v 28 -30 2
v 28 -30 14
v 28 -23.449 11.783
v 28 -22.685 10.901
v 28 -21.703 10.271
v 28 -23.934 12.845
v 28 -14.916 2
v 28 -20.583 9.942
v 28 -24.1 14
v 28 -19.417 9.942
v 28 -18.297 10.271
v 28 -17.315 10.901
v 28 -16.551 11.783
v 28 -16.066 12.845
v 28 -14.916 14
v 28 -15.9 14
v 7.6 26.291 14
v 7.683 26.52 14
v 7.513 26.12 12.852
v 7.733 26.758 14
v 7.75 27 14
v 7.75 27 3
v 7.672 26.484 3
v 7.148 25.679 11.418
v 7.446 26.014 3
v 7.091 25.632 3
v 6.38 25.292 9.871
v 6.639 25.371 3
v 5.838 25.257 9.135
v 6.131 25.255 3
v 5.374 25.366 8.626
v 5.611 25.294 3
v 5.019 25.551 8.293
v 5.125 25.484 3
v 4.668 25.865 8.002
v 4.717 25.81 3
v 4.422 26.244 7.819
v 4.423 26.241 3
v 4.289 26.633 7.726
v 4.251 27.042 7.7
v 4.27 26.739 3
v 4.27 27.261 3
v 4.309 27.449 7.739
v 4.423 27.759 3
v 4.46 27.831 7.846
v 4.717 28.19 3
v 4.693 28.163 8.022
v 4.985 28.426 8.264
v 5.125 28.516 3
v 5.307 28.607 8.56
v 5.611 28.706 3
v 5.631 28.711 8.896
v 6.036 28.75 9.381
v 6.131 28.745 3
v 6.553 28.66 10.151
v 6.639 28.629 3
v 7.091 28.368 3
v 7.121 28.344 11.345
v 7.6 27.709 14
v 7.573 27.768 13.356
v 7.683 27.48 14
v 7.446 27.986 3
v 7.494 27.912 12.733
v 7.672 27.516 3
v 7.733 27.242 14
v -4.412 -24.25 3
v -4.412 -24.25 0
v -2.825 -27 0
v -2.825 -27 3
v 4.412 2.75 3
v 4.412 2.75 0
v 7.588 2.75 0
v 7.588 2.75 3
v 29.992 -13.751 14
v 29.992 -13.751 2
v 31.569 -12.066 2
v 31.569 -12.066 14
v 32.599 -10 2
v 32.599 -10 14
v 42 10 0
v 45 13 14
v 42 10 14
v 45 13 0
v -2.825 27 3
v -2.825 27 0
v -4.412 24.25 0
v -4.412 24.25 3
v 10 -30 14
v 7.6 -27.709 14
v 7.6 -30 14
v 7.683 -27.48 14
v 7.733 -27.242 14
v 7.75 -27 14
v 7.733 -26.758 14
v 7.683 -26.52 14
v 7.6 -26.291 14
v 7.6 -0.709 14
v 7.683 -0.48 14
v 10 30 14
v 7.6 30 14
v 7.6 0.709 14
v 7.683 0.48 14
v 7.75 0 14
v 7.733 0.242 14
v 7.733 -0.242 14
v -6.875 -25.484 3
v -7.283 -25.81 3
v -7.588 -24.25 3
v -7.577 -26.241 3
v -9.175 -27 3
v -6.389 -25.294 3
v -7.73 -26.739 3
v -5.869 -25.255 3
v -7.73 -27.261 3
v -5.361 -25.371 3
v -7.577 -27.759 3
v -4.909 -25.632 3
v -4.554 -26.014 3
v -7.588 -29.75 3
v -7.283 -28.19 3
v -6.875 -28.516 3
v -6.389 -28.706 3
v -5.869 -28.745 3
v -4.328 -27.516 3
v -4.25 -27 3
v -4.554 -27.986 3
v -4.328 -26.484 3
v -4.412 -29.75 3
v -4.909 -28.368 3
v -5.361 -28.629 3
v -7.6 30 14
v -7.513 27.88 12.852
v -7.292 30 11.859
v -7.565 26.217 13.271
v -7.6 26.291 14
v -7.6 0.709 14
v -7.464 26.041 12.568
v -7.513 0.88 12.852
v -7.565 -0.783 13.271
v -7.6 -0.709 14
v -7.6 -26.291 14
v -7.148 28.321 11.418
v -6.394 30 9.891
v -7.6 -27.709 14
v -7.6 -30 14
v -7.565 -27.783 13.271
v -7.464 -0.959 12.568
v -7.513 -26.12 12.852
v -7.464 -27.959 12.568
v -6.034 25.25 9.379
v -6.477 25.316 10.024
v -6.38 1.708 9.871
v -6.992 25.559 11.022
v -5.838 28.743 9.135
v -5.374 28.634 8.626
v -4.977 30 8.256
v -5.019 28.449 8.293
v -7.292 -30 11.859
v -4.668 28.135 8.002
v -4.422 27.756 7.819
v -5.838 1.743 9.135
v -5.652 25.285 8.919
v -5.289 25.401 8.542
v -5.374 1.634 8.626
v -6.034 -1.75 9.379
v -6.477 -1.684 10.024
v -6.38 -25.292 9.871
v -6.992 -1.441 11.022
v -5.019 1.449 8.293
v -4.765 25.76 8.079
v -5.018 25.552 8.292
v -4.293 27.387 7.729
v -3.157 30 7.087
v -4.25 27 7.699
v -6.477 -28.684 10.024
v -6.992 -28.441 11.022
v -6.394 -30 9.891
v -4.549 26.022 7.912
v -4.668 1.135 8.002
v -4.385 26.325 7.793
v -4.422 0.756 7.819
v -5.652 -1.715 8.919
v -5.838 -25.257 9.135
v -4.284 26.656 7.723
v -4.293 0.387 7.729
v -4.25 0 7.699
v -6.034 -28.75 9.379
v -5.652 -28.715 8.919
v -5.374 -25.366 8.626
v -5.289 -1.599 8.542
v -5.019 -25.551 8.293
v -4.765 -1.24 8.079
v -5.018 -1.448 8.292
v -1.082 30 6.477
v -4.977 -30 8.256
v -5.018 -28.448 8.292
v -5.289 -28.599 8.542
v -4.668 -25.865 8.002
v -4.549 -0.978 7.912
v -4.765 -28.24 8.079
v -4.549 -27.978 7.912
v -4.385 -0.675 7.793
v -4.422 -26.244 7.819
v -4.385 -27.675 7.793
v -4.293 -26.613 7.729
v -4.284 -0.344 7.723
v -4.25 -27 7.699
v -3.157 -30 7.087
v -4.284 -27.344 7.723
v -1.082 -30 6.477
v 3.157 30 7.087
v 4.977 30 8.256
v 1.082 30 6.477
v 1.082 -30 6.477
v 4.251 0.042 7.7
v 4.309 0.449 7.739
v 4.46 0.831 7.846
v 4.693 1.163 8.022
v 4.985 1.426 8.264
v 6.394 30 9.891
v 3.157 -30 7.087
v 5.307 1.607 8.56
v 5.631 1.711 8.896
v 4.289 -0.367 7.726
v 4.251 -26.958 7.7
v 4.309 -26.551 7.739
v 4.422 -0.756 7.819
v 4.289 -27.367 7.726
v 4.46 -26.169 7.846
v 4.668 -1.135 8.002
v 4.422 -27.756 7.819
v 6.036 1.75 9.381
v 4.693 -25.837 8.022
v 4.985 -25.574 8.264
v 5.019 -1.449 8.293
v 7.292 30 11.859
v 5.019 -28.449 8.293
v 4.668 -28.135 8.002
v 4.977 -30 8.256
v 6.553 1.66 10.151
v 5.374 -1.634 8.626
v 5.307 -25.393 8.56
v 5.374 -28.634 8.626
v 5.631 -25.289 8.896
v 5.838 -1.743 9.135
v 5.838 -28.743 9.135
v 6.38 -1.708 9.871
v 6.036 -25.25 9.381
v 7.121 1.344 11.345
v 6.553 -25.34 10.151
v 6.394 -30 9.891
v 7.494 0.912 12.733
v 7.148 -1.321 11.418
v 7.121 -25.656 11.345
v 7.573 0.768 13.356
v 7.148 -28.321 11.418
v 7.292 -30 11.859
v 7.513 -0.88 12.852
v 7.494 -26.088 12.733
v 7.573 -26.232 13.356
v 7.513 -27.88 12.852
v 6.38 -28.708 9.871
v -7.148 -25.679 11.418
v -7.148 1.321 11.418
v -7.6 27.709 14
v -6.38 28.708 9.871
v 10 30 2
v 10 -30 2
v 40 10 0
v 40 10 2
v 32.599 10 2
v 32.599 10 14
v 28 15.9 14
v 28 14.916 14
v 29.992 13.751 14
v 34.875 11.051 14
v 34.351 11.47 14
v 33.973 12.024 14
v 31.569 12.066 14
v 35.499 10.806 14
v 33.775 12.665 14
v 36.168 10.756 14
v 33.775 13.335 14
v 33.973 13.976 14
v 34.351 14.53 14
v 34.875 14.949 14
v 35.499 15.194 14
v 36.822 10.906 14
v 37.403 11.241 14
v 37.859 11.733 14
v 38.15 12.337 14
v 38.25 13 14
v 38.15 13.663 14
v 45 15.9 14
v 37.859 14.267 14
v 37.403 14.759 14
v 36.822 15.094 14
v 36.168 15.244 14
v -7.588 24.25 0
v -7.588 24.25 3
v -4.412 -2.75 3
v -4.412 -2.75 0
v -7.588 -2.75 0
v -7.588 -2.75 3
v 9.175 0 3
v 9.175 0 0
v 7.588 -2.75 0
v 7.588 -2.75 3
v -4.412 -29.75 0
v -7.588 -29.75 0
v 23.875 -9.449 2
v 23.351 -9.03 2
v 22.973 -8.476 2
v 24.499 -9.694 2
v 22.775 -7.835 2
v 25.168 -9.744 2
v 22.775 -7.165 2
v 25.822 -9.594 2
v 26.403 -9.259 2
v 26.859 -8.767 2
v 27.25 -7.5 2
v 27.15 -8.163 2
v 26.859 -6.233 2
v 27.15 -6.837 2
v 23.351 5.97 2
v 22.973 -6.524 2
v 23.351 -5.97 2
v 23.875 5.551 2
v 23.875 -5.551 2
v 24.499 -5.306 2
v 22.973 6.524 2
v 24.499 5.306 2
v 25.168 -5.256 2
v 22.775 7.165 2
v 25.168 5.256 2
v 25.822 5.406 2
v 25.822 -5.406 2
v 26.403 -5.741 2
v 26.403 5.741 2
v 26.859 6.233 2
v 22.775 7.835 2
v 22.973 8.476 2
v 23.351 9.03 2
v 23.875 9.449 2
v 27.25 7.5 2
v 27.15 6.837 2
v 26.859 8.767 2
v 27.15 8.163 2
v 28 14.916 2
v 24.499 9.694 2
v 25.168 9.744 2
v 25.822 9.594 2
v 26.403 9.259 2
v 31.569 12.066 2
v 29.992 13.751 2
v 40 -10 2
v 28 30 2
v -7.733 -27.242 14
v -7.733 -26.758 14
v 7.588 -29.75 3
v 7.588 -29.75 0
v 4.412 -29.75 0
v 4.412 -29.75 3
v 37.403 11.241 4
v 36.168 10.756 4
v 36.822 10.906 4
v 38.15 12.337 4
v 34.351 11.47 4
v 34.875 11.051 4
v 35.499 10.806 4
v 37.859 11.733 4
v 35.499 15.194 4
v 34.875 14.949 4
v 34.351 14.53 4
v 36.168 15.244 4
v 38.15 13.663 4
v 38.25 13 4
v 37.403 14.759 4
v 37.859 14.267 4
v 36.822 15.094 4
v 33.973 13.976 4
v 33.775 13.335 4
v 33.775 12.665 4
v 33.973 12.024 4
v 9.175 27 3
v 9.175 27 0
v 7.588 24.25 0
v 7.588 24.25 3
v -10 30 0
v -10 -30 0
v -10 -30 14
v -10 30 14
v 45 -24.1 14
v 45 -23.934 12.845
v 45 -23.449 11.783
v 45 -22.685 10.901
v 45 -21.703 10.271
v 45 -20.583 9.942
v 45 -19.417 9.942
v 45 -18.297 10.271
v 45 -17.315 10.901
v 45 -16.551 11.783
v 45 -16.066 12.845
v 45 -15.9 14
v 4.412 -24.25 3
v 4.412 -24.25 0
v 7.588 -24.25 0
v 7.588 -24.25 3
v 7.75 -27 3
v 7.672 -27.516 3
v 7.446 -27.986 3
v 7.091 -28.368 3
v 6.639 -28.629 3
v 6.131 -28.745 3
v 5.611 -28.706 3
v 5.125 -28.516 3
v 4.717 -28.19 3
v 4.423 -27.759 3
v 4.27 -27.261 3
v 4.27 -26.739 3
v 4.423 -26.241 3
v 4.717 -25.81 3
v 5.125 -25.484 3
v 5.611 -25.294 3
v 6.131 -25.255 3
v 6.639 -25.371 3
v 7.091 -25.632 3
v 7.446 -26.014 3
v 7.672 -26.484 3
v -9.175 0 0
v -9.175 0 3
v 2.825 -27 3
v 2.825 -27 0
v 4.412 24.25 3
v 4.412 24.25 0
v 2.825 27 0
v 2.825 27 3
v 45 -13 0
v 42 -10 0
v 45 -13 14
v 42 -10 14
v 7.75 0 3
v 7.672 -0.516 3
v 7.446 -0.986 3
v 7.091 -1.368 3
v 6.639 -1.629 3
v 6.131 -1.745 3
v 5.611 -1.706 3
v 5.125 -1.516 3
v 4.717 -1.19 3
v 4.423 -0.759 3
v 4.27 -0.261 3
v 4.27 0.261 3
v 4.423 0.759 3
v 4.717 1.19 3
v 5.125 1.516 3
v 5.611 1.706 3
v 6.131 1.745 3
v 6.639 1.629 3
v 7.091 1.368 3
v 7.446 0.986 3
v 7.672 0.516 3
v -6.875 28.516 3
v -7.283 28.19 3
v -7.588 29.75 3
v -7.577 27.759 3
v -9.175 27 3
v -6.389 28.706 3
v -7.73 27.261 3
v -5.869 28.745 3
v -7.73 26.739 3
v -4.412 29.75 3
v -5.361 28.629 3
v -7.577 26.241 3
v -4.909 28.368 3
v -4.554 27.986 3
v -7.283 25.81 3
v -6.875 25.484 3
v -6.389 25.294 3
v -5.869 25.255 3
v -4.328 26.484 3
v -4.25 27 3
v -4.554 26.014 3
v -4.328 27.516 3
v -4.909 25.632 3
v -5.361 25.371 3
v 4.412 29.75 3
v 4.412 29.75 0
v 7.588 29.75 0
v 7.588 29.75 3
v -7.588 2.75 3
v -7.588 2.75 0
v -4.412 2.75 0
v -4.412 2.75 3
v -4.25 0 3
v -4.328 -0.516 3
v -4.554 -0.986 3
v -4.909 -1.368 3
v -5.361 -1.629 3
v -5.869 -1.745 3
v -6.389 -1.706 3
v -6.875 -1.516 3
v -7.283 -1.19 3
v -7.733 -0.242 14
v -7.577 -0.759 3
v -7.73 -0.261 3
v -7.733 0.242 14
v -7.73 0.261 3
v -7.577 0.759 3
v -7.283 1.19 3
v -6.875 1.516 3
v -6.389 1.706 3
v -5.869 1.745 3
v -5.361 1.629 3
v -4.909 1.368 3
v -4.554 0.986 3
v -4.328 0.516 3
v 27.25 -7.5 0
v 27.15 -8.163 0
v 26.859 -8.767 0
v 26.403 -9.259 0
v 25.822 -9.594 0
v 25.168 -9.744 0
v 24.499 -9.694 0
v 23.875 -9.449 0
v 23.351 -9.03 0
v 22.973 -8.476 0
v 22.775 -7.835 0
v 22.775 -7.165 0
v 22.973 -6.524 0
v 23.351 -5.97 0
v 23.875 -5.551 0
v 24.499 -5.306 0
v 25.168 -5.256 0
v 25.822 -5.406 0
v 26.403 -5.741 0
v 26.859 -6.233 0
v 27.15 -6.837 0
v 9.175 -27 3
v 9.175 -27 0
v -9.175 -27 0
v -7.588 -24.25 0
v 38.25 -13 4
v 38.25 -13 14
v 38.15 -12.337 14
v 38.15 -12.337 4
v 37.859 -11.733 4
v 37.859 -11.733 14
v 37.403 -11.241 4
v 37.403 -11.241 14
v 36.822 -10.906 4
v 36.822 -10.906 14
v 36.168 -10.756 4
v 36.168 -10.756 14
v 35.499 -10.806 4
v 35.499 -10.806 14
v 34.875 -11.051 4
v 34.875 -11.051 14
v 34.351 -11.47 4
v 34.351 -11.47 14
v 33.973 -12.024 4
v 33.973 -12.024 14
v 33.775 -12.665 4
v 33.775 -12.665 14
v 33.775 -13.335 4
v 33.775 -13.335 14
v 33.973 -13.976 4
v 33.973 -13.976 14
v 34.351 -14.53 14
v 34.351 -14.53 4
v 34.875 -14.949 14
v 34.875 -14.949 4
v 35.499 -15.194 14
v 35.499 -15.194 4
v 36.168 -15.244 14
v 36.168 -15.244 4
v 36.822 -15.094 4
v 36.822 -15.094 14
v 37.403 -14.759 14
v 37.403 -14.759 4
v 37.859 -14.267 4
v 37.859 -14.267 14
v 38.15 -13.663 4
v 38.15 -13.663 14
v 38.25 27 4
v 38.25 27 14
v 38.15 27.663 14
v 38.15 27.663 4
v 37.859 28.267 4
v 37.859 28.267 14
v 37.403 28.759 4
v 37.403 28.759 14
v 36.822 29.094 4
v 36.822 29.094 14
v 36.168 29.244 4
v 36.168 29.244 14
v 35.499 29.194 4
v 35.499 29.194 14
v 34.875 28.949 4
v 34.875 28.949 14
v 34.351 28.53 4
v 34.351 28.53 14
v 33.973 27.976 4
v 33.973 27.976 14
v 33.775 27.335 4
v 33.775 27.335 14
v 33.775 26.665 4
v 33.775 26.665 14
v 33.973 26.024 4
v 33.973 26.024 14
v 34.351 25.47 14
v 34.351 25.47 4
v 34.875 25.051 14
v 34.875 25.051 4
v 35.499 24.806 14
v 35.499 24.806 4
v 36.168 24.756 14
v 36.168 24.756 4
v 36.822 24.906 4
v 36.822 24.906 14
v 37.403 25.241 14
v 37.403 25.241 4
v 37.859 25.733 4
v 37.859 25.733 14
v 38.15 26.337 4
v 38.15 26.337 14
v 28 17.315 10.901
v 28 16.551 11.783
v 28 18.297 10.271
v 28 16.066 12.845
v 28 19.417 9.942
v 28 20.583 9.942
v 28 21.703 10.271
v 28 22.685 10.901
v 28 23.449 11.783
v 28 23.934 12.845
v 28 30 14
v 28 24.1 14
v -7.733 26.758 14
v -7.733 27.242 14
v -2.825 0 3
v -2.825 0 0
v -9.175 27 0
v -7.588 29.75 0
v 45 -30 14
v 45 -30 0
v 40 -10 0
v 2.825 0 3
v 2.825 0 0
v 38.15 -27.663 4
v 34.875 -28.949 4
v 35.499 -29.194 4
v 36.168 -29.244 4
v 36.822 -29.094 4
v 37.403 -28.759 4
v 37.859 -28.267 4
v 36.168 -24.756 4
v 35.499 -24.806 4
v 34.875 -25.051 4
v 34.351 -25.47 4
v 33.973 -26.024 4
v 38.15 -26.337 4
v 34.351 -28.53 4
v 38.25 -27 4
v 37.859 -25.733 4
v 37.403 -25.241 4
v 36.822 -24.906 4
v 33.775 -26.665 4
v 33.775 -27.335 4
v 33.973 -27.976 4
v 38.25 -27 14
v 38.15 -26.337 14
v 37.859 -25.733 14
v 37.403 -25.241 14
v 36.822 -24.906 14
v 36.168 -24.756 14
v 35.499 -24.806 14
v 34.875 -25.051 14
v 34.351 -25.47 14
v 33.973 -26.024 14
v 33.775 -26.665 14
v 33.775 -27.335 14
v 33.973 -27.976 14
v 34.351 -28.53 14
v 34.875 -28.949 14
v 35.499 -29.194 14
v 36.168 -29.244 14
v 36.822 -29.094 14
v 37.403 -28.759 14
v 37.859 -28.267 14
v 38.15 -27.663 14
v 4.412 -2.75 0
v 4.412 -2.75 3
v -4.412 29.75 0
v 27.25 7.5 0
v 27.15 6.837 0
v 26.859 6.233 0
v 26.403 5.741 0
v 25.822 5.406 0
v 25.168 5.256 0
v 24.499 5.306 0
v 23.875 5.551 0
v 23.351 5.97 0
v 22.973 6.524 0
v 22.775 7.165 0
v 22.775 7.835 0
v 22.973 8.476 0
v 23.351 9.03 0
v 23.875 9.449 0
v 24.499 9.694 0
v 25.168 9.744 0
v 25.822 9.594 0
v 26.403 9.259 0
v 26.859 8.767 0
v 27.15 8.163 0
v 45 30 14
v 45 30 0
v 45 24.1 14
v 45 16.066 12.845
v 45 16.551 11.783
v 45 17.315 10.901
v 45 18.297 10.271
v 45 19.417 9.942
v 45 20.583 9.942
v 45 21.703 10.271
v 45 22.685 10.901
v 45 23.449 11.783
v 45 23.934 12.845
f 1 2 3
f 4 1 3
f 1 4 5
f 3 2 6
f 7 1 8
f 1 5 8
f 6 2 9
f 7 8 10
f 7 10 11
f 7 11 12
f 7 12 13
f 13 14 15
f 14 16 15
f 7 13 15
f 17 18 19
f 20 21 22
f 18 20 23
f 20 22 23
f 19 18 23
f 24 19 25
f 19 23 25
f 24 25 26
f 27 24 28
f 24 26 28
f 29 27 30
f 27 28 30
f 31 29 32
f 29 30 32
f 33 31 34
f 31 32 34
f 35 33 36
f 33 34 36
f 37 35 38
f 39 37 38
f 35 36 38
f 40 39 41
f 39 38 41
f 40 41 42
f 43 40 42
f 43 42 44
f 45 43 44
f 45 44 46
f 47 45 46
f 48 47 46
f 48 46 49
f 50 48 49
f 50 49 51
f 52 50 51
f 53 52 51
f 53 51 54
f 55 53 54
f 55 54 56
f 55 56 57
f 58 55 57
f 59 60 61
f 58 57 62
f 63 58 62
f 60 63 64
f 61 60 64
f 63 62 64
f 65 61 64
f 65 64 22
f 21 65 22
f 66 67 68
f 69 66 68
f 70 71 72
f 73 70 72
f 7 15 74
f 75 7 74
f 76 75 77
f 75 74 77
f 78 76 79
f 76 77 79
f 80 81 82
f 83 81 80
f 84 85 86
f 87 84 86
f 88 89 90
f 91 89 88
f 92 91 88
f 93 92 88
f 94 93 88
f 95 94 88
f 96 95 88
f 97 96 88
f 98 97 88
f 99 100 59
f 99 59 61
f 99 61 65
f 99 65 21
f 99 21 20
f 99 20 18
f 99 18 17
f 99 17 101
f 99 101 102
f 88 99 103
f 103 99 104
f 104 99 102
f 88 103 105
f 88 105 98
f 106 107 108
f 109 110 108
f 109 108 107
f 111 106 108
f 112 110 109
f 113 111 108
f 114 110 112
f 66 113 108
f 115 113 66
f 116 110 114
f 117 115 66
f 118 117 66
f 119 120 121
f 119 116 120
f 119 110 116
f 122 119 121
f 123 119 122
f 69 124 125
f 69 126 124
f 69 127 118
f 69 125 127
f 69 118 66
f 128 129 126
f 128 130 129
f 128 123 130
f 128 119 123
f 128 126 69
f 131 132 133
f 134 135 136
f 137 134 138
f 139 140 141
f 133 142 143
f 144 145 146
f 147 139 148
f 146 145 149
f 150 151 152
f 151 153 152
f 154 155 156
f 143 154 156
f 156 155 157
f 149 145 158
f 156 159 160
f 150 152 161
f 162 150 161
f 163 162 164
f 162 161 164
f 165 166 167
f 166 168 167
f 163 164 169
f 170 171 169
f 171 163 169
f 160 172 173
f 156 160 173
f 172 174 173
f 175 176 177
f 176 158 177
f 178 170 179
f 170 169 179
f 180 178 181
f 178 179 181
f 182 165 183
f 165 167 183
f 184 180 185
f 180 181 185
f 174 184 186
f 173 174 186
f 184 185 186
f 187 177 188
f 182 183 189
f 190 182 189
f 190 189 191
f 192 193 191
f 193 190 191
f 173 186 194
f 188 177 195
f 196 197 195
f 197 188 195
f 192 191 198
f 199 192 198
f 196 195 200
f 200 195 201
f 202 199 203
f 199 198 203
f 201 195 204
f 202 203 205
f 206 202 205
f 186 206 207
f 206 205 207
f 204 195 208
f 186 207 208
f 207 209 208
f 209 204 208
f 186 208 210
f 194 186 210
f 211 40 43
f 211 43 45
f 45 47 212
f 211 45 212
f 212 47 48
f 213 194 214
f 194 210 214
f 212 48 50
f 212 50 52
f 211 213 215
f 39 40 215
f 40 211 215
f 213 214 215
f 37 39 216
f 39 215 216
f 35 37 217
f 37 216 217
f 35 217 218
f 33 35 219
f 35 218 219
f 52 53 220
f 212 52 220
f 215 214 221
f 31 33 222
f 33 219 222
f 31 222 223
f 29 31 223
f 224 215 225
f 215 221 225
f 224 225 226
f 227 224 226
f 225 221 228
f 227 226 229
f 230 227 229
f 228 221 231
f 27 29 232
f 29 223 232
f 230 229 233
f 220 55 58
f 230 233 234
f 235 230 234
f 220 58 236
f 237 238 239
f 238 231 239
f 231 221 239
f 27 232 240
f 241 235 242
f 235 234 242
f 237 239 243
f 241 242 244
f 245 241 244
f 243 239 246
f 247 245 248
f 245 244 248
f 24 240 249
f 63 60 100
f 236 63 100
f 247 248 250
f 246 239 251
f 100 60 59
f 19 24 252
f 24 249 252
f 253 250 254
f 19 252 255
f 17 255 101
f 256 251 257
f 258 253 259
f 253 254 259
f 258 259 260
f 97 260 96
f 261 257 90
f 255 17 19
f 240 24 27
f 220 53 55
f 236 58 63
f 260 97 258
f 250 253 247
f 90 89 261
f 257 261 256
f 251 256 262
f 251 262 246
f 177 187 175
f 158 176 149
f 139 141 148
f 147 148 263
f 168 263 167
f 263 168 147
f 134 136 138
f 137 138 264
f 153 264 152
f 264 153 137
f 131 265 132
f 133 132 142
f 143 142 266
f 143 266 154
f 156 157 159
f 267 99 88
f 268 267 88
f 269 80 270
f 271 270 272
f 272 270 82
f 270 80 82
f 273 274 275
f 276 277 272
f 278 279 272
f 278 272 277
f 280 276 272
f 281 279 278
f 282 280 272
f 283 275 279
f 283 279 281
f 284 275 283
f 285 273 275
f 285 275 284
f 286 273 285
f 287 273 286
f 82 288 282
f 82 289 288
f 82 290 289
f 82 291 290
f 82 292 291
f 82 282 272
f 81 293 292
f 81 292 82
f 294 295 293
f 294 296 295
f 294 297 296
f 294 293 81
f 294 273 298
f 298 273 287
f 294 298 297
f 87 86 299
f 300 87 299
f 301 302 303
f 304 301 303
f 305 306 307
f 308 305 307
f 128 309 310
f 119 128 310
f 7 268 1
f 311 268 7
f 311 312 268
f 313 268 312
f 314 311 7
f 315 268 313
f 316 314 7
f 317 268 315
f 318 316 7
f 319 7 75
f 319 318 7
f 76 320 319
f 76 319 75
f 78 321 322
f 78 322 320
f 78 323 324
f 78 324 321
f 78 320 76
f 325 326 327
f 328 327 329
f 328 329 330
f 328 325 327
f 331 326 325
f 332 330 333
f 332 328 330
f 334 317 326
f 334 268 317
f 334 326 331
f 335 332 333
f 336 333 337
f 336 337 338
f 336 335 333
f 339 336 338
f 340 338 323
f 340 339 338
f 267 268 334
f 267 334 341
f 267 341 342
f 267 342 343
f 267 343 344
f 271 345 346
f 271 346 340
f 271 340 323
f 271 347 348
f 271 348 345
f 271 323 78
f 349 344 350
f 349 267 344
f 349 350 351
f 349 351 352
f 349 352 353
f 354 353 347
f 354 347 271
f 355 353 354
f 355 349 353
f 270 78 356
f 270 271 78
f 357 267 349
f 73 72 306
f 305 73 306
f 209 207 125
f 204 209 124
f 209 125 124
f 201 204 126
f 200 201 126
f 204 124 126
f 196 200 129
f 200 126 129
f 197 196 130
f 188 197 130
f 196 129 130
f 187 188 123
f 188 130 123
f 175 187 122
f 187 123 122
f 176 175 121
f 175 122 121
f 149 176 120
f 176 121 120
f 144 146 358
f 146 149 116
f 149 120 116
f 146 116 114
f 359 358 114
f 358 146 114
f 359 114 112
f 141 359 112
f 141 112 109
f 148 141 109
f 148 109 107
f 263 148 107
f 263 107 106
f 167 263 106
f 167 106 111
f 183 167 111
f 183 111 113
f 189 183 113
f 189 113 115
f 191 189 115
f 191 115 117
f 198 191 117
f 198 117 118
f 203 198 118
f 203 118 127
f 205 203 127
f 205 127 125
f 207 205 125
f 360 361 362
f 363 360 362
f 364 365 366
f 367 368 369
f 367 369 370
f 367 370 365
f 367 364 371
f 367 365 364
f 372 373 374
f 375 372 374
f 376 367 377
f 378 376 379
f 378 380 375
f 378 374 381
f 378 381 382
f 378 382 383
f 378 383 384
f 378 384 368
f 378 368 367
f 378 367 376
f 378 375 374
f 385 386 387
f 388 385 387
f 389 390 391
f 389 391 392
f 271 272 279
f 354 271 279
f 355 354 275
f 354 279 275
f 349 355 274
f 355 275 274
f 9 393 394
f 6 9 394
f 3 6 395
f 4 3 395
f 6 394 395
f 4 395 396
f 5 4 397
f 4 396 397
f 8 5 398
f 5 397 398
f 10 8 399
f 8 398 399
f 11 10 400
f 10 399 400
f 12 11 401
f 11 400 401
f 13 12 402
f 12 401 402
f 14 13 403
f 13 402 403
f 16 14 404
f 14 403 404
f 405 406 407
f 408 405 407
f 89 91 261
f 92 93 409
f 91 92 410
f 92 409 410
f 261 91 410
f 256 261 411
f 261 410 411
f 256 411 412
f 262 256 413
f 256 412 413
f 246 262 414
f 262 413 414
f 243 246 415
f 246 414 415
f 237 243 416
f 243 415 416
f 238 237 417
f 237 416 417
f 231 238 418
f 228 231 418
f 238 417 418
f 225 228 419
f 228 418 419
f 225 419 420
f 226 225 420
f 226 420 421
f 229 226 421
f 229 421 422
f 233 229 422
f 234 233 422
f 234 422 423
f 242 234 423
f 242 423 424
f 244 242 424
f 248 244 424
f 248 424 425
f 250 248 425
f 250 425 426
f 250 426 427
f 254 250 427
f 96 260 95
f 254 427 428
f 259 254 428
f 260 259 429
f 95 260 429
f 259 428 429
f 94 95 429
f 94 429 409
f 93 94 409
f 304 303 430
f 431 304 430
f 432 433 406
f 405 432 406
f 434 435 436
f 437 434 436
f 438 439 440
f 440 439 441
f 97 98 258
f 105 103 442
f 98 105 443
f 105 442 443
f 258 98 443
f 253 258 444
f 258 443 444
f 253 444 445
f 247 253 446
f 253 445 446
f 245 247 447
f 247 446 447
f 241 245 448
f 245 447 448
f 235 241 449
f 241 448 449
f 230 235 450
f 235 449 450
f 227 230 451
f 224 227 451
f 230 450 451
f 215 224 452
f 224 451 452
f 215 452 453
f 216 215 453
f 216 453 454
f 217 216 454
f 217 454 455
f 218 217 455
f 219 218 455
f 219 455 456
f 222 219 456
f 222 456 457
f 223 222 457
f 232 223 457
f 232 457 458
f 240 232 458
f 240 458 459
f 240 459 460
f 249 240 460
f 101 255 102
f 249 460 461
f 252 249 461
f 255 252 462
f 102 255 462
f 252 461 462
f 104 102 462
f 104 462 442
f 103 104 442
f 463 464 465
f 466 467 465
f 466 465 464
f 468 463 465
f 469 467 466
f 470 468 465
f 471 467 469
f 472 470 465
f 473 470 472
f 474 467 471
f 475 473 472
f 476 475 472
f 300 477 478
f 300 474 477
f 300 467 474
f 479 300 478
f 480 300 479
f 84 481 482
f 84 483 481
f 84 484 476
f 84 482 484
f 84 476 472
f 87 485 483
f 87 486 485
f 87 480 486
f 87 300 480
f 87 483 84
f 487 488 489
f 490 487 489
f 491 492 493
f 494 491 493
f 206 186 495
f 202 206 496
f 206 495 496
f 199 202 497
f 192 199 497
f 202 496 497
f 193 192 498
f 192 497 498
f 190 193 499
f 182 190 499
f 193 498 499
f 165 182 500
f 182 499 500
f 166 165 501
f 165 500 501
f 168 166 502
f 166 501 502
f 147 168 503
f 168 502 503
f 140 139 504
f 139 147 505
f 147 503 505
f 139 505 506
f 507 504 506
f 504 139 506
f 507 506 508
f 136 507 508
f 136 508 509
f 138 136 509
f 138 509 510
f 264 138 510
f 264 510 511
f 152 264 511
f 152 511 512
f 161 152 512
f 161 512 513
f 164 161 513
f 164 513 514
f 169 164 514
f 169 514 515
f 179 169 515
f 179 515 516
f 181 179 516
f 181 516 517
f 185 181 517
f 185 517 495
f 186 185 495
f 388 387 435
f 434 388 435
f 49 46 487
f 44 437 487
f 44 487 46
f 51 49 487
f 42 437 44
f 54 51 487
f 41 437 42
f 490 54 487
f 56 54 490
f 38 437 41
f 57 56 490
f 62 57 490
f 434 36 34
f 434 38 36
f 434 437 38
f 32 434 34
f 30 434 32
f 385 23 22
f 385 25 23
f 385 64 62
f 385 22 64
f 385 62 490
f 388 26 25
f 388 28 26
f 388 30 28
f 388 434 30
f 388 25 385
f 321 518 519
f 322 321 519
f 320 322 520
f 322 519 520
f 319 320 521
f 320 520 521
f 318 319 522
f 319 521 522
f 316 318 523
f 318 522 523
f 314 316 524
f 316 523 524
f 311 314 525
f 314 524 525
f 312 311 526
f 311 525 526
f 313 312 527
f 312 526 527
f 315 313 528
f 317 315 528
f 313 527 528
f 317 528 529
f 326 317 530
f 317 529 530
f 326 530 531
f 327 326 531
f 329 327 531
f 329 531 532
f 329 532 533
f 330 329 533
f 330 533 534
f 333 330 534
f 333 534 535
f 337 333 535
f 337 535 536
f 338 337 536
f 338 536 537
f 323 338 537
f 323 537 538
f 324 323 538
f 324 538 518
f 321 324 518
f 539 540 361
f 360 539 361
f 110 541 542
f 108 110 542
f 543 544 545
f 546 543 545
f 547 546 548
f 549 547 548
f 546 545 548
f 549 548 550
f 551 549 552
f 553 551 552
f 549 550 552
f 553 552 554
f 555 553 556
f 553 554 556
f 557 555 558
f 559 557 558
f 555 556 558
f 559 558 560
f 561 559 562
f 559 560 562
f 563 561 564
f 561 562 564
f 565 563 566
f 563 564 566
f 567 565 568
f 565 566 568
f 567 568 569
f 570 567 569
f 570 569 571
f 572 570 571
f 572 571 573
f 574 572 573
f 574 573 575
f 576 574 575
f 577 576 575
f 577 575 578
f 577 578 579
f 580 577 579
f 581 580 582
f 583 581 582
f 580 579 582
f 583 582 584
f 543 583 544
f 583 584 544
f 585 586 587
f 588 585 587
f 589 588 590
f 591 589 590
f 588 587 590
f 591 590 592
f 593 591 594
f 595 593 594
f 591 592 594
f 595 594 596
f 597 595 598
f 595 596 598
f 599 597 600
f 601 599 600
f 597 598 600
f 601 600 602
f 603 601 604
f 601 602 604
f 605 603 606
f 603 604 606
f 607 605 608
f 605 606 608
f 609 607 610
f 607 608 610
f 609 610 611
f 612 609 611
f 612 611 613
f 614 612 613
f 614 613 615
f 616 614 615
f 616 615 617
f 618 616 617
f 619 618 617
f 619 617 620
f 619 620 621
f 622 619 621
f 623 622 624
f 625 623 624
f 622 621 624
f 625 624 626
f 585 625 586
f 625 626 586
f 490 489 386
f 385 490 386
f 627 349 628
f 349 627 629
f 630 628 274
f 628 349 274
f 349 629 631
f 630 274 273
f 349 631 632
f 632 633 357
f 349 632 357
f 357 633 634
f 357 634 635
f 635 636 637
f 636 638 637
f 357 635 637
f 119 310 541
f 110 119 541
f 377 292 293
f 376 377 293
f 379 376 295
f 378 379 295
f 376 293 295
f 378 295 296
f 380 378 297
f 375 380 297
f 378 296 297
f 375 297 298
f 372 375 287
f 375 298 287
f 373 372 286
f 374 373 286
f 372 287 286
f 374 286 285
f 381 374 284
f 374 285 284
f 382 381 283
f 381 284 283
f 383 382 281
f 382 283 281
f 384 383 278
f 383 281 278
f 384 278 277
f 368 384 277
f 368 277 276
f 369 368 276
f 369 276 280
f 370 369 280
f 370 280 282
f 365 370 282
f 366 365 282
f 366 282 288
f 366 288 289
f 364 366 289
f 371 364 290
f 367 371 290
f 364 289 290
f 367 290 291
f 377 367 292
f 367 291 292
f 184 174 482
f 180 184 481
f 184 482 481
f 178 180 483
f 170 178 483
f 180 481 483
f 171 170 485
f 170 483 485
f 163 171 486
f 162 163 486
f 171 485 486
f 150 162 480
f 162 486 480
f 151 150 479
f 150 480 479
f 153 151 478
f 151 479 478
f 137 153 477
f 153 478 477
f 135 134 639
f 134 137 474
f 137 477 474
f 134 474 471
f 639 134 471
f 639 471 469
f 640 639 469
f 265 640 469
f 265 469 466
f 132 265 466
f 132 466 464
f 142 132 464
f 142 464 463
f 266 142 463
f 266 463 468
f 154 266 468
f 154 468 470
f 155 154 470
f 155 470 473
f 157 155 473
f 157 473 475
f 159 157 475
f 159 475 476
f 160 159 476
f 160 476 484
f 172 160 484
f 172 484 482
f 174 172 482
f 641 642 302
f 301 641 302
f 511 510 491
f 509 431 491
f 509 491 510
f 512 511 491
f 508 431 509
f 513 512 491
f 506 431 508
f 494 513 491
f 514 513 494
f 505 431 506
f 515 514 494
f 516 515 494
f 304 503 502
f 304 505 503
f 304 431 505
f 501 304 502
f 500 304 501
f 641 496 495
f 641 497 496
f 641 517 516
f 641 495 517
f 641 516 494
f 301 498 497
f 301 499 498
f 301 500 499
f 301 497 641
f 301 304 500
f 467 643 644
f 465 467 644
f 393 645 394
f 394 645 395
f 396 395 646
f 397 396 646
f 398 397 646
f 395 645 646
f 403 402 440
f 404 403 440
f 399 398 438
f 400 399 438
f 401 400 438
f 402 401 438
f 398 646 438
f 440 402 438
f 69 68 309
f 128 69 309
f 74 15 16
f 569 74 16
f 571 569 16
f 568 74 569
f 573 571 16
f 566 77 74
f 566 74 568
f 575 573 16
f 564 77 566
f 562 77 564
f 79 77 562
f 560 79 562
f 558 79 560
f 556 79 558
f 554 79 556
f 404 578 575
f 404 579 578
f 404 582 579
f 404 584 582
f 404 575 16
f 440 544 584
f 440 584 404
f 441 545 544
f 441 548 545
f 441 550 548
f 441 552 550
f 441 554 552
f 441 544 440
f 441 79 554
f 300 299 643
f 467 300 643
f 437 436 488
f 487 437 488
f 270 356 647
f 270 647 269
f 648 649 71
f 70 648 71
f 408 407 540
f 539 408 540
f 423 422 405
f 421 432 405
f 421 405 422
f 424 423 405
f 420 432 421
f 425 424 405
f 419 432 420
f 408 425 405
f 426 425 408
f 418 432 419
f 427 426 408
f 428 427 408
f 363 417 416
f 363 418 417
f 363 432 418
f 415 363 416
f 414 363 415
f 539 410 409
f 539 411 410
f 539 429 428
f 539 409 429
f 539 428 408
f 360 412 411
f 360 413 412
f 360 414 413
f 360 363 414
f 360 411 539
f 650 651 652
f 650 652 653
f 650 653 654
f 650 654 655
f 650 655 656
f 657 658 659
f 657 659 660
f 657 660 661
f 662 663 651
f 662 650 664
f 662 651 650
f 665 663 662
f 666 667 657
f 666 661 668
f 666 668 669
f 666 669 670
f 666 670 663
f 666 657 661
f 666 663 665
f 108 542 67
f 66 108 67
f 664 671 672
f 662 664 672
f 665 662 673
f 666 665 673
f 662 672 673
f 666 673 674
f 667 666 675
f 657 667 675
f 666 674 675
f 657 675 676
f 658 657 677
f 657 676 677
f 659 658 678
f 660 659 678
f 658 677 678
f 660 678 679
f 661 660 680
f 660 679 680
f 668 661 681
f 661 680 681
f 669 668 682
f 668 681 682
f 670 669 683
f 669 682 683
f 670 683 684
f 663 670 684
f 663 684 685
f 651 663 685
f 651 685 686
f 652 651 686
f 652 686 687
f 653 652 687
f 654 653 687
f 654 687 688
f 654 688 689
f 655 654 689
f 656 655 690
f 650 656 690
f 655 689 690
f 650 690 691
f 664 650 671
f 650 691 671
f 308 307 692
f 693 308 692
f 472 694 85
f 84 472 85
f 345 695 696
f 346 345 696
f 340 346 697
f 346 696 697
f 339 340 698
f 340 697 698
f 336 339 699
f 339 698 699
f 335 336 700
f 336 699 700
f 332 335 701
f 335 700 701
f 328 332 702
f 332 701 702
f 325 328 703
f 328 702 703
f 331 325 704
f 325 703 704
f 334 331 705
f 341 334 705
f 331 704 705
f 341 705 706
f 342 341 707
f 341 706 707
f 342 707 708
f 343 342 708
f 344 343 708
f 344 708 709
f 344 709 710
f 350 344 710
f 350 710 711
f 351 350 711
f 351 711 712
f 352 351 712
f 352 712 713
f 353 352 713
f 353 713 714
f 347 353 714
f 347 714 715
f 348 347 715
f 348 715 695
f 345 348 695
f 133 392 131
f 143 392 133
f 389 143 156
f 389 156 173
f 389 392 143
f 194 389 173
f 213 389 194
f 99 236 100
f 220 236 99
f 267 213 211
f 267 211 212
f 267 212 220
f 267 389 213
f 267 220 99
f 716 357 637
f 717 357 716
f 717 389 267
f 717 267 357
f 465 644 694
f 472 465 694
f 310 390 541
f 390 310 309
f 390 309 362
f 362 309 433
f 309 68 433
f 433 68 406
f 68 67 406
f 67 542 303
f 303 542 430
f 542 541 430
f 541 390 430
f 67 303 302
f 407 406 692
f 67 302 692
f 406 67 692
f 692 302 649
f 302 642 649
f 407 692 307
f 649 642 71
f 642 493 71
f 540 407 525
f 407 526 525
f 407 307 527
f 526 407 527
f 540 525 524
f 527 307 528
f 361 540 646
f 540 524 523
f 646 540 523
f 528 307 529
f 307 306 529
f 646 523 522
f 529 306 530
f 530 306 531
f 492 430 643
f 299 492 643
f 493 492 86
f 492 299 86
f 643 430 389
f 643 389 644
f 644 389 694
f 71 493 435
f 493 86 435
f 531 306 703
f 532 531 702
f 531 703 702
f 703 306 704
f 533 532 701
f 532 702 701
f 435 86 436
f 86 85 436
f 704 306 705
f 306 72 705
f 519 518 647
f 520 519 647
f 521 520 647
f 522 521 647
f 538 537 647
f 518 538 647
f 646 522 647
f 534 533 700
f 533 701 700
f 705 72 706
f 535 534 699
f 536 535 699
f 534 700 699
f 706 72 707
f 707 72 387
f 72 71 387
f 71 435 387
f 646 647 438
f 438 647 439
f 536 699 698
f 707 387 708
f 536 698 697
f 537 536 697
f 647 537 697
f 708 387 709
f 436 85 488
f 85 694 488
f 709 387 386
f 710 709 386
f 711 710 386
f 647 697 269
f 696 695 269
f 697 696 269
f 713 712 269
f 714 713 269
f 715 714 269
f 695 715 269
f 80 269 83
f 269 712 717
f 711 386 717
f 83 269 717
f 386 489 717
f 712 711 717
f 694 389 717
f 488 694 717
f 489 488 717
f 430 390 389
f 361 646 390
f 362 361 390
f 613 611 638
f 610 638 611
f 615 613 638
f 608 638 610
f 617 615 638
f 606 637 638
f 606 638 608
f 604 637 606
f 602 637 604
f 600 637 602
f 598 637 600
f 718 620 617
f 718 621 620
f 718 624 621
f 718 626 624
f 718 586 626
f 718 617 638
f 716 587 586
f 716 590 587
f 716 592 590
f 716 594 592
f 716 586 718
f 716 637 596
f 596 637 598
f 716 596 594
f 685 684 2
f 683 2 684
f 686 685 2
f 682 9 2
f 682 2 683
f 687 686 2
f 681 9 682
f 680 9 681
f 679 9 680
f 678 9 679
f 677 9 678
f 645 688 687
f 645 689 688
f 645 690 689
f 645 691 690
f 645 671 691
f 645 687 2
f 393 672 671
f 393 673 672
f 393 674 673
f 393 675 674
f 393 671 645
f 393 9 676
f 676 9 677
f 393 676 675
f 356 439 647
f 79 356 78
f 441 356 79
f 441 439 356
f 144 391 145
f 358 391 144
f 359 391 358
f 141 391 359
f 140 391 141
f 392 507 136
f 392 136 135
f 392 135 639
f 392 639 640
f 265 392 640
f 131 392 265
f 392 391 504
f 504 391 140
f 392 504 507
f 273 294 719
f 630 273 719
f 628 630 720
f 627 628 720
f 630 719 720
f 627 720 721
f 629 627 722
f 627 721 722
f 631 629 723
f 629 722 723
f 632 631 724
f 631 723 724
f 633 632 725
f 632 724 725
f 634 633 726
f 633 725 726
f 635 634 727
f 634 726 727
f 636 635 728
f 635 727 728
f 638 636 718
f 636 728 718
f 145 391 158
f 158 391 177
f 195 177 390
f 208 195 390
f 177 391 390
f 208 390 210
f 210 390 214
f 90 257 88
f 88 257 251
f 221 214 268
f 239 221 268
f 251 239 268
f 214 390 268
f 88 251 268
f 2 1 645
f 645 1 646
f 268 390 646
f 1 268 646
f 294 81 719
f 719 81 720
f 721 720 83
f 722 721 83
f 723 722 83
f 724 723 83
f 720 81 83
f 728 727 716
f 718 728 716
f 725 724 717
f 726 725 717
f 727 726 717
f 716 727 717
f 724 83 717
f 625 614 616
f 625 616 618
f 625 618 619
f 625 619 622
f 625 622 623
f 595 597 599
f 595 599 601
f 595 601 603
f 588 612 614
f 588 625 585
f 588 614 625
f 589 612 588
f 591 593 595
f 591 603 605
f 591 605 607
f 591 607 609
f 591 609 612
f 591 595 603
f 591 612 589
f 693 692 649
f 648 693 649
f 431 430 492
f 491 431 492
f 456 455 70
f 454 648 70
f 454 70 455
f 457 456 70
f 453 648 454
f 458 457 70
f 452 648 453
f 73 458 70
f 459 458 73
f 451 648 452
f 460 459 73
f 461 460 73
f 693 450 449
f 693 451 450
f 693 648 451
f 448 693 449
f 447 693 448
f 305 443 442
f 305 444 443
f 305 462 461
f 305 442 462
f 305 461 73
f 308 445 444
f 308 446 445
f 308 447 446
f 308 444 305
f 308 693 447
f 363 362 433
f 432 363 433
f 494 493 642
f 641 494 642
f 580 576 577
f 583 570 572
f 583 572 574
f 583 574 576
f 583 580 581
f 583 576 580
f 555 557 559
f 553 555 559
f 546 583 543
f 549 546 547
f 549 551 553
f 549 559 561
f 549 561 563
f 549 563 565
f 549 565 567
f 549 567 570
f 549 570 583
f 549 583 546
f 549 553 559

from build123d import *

# Parameters (mm, degrees)
SKETCH_W        = 55
SKETCH_H        = 60
PAD_DEPTH       = 14
SKETCH001_R     = 7.6
POCKET_DEPTH    = 60.001
SKETCH002_R     = 1.75
POCKET001_DEPTH = 14.001
POCKET002_DEPTH = 12
SKETCH004_R     = 2.25
POCKET003_DEPTH = 14.001
SKETCH008_R     = 4.1
POCKET005_DEPTH = 20
SKETCH010_W     = 20
SKETCH010_H     = 25
POCKET006_DEPTH = 5
SKETCH011_R     = 2.25
POCKET007_DEPTH = 10
CHAMFER_SIZE    = 3
CHAMFER001_SIZE = 3
POCKET008_DEPTH = 3


with BuildPart() as part:
    # Sketch → Pad (new body)
    with BuildSketch(Plane.XY):
        with Locations((17.5, 0)):
            Rectangle(SKETCH_W, SKETCH_H)
    extrude(amount=PAD_DEPTH)

    # Sketch001 → Pocket (cut, through all)
    with BuildSketch(Plane.XZ.offset(30)):
        with Locations((0, 14)):
            Circle(SKETCH001_R)
    extrude(amount=-POCKET_DEPTH, mode=Mode.SUBTRACT)

    # Sketch002 → Pocket001 (cut, through all)
    with BuildSketch(Plane(origin=(0, 0, 0), x_dir=(1, 0, 0), z_dir=(0, 0, -1))):
        with Locations((-6, 27)):
            Circle(SKETCH002_R)
        with Locations((-6, -27)):
            Circle(SKETCH002_R)
        with Locations((6, 27)):
            Circle(SKETCH002_R)
        with Locations((6, -27)):
            Circle(SKETCH002_R)
        with Locations((6, 0)):
            Circle(SKETCH002_R)
        with Locations((-6, 0)):
            Circle(SKETCH002_R)
    extrude(amount=-POCKET001_DEPTH, mode=Mode.SUBTRACT)

    # Sketch003 → Pocket002 (cut)
    with BuildSketch(Plane.XY.offset(14)):
        with BuildLine():
            Line((10, 35), (10, -35))
            Line((10, -35), (28, -35))
            Line((28, -35), (28, -14.916198))
            ThreePointArc((28, -14.916198), (30.841983, -12.965458), (32.599342, -10))
            Line((32.599342, -10), (52.599342, -10))
            Line((52.599342, -10), (52.599342, 10))
            Line((52.599342, 10), (32.599342, 10))
            ThreePointArc((32.599342, 10), (30.841983, 12.965458), (28, 14.916198))
            Line((28, 14.916198), (28, 35))
            Line((28, 35), (10, 35))
        make_face()
    extrude(amount=-POCKET002_DEPTH, mode=Mode.SUBTRACT)

    # Sketch004 → Pocket003 (cut, through all)
    with BuildSketch(Plane(origin=(0, 0, 0), x_dir=(1, 0, 0), z_dir=(0, 0, -1))):
        with Locations((25, 7.5)):
            Circle(SKETCH004_R)
        with Locations((25, -7.5)):
            Circle(SKETCH004_R)
    extrude(amount=-POCKET003_DEPTH, mode=Mode.SUBTRACT)

    # Sketch008 → Pocket005 (cut)
    with BuildSketch(Plane.YZ.offset(45)):
        with Locations((-20, 14)):
            Circle(SKETCH008_R)
        with Locations((20, 14)):
            Circle(SKETCH008_R)
    extrude(amount=-POCKET005_DEPTH, mode=Mode.SUBTRACT)

    # Sketch010 → Pocket006 (cut)
    with BuildSketch(Plane.YZ.offset(45)):
        with Locations((0, 6.5)):
            Rectangle(SKETCH010_W, SKETCH010_H)
    extrude(amount=-POCKET006_DEPTH, mode=Mode.SUBTRACT)

    # Sketch011 → Pocket007 (cut)
    with BuildSketch(Plane.XY.offset(14)):
        with Locations((36, 27)):
            Circle(SKETCH011_R)
        with Locations((36, 13)):
            Circle(SKETCH011_R)
        with Locations((36, -13)):
            Circle(SKETCH011_R)
        with Locations((36, -27)):
            Circle(SKETCH011_R)
    extrude(amount=-POCKET007_DEPTH, mode=Mode.SUBTRACT)

    # Chamfer
    chamfer_edges = [part.edges().sort_by_distance(p)[0] for p in [
        (45, -10, 8),
        (45, -10, 1),
    ]]
    chamfer(chamfer_edges, length=CHAMFER_SIZE)

    # Chamfer001
    chamfer001_edges = [part.edges().sort_by_distance(p)[0] for p in [
        (45, 10, 8),
        (45, 10, 1),
    ]]
    chamfer(chamfer001_edges, length=CHAMFER001_SIZE)

    # Sketch012 → Pocket008 (cut)
    with BuildSketch(Plane(origin=(0, 0, 0), x_dir=(1, 0, 0), z_dir=(0, 0, -1))):
        Polygon((-4.412285, 29.750003), (-7.587715, 29.750003), (-9.17543, 27), (-7.587715, 24.249997), (-4.412285, 24.249997), (-2.82457, 27), align=None)
        Polygon((7.587715, 29.750003), (4.412285, 29.750003), (2.82457, 27), (4.412285, 24.249997), (7.587715, 24.249997), (9.17543, 27), align=None)
        Polygon((-4.412285, 2.750003), (-7.587715, 2.750003), (-9.17543, 0), (-7.587715, -2.750003), (-4.412285, -2.750003), (-2.82457, 0), align=None)
        Polygon((7.587715, 2.750003), (4.412285, 2.750003), (2.82457, 0), (4.412285, -2.750003), (7.587715, -2.750003), (9.17543, 0), align=None)
        Polygon((-4.412285, -24.249997), (-7.587715, -24.249997), (-9.17543, -27), (-7.587715, -29.750003), (-4.412285, -29.750003), (-2.82457, -27), align=None)
        Polygon((7.587715, -24.249997), (4.412285, -24.249997), (2.82457, -27), (4.412285, -29.750003), (7.587715, -29.750003), (9.17543, -27), align=None)
    extrude(amount=-POCKET008_DEPTH, mode=Mode.SUBTRACT)


solid = part.part
